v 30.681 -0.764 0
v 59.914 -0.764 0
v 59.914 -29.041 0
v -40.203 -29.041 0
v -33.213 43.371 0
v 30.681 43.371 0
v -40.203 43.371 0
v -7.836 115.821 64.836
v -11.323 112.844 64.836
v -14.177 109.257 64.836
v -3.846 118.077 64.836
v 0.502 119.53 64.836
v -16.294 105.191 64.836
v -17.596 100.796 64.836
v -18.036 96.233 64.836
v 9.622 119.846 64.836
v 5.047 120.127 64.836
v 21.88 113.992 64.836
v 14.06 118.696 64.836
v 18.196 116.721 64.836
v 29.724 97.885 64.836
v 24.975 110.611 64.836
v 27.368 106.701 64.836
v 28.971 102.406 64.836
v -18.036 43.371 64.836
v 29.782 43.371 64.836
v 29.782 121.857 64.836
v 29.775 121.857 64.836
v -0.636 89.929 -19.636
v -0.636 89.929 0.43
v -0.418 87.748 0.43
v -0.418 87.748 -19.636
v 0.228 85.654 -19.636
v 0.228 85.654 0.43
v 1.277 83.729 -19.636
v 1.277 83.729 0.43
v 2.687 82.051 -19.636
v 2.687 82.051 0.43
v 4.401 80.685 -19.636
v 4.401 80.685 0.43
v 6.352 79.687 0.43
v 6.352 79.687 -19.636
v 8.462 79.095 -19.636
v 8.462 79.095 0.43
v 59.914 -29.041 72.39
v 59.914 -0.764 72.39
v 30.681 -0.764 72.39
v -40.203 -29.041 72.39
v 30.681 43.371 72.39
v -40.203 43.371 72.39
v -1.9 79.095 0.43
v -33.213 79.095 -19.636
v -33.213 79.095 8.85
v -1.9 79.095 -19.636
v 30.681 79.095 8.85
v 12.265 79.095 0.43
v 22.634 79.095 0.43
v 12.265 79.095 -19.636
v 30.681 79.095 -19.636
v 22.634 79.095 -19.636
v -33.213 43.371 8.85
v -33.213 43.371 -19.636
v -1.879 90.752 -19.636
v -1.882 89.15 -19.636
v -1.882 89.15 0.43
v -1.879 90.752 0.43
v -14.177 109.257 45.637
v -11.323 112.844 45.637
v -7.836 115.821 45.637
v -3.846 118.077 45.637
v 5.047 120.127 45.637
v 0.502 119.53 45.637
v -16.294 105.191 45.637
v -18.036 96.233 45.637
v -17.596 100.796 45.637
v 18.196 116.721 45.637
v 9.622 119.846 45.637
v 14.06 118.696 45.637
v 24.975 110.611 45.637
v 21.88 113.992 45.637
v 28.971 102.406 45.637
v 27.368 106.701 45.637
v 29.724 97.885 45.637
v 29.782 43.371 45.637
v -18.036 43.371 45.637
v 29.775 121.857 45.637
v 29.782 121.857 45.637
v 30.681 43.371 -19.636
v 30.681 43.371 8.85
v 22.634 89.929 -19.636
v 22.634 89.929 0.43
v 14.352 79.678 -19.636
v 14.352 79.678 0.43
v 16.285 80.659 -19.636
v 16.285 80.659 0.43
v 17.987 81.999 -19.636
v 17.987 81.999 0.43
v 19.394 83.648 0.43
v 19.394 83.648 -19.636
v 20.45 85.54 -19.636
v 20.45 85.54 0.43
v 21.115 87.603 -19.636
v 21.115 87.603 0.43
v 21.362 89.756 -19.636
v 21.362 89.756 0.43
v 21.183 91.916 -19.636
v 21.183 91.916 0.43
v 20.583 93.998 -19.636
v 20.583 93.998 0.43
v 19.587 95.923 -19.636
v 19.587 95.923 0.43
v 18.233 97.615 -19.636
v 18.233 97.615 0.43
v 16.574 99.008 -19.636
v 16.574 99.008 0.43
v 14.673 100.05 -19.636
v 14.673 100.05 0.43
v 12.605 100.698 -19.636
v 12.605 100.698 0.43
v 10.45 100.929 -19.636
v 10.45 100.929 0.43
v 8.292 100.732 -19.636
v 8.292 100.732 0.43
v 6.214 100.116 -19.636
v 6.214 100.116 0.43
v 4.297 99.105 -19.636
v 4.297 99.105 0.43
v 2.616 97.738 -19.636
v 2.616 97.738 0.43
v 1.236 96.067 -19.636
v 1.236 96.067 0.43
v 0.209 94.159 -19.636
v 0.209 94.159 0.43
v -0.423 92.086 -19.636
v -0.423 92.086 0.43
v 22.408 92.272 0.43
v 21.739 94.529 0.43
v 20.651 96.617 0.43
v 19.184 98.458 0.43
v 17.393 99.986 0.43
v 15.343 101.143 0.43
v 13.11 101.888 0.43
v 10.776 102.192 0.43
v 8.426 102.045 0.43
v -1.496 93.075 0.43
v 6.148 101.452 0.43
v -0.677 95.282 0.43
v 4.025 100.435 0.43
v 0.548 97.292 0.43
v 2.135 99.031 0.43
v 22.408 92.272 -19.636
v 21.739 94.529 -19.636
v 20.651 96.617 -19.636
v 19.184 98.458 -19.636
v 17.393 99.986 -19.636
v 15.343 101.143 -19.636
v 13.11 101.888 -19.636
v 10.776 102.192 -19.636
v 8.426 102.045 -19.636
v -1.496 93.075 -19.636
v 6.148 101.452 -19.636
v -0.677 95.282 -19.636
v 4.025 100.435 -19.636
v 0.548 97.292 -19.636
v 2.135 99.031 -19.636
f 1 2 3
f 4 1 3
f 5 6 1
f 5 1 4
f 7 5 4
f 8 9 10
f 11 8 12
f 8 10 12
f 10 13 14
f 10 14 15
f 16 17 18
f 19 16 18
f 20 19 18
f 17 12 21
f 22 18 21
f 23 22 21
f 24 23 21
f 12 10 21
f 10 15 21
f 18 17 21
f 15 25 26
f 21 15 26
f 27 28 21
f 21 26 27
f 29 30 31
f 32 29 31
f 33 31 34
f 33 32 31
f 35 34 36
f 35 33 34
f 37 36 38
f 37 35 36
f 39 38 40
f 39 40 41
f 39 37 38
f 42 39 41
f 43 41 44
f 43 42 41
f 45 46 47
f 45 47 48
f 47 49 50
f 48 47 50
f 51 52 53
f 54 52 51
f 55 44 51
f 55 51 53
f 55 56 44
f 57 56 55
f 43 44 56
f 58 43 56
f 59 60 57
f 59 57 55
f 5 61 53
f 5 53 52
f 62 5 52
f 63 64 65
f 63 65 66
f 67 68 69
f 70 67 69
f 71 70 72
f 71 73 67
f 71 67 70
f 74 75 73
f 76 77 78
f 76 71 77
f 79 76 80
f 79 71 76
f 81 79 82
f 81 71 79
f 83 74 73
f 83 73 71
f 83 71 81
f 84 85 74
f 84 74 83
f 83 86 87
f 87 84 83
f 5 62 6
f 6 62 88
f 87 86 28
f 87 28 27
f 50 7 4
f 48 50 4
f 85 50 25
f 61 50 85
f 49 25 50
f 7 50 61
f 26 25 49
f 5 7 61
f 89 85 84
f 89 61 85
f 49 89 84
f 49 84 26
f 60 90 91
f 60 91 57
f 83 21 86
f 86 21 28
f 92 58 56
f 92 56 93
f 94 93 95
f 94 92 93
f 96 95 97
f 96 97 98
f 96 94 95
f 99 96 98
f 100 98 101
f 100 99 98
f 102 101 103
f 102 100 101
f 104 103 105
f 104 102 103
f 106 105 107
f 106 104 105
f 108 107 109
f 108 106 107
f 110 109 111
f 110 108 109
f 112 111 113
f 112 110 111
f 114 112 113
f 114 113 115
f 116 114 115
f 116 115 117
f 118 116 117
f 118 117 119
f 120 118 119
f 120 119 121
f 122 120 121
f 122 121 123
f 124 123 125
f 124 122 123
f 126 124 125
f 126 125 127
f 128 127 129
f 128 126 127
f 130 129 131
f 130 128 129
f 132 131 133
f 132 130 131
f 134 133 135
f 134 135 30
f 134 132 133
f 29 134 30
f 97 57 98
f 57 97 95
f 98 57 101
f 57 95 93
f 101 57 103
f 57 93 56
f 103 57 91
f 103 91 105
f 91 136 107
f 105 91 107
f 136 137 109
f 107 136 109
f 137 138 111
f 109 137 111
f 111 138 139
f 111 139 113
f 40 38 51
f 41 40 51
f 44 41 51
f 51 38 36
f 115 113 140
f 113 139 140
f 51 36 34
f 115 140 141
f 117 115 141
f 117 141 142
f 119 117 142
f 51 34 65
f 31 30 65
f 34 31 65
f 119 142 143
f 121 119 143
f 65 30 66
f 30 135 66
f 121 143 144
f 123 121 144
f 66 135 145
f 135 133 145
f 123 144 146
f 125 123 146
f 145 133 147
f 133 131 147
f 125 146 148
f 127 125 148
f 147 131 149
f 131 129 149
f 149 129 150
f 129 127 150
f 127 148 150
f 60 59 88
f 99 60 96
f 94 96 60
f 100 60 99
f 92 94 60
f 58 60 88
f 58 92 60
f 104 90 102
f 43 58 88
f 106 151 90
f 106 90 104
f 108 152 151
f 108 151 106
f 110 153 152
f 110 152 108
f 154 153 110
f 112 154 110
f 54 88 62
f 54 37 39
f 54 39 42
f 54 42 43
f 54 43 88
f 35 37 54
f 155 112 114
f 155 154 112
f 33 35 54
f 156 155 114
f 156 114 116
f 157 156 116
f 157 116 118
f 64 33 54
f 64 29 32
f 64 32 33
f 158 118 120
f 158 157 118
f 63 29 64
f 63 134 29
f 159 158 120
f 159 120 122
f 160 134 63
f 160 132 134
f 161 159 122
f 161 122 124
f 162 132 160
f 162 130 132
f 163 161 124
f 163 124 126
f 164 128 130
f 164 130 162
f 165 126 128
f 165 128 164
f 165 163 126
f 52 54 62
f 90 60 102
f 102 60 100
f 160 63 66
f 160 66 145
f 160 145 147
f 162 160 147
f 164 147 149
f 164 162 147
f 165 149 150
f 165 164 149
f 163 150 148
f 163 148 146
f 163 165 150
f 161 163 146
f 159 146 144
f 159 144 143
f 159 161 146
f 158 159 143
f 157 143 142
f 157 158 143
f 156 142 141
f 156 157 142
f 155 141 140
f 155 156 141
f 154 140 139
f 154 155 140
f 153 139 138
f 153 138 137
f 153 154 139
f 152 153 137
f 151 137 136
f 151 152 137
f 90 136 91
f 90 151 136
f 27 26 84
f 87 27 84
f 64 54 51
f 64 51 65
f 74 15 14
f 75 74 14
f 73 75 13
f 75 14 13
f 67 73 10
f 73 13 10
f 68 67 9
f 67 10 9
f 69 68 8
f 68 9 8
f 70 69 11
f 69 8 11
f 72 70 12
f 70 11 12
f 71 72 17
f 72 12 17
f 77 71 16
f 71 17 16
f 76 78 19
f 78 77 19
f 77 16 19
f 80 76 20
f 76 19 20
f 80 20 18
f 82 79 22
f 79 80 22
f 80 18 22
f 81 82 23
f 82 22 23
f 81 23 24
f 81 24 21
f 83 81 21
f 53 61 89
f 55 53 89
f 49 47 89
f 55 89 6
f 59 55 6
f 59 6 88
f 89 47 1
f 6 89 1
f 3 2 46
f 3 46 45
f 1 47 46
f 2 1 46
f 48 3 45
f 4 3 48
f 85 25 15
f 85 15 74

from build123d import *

# Parameters (mm, degrees)
EXTRUDE_1_DEPTH     = 72.39
SKETCH_2_W          = 63.894569667
SKETCH_2_H          = 50.584743582
EXTRUDE_2_DEPTH     = 35.72348927
SKETCH_3_W          = 47.81706323
SKETCH_3_H          = 19.199275388
EXTRUDE_4_DEPTH     = 78.486
CUT_EXTRUDE_4_DEPTH = 22.098
SKETCH_7_W          = 85.131498904
SKETCH_7_H          = 43.590498022
CUT_EXTRUDE_5_DEPTH = 22.098
EXTRUDE_5_DEPTH     = 20.066


with BuildPart() as part:
    # 草图1 → 凸台-拉伸1 (new body)
    with BuildSketch(Plane.XY):
        Polygon((30.681441224, -0.764247788), (59.9139191, -0.764247788), (59.9139191, -29.041415929), (-40.202541077, -29.041415929), (-40.202541077, -0.764247788), (-40.202541077, 43.371061947), (30.681441224, 43.371061947), align=None)
    extrude(amount=EXTRUDE_1_DEPTH)

    # 草图2 → 凸台-拉伸2 (add)
    with BuildSketch(Plane(origin=(0, 43.371061947, 0), x_dir=(1, 0, 0), z_dir=(0, 1, 0))):
        with Locations((-1.26584361, 16.441925792)):
            Rectangle(SKETCH_2_W, SKETCH_2_H)
    extrude(amount=EXTRUDE_2_DEPTH)

    # 草图3 → 凸台-拉伸4 (add)
    with BuildSketch(Plane(origin=(0, 43.371061947, 0), x_dir=(1, 0, 0), z_dir=(0, 1, 0))):
        with Locations((5.873027985, -55.236552657)):
            Rectangle(SKETCH_3_W, SKETCH_3_H)
    extrude(amount=EXTRUDE_4_DEPTH)

    # 草图6 → 切除-拉伸4 (cut)
    with BuildSketch(Plane.XY.offset(64.836190351)):
        with BuildLine():
            Line((-18.03550363, 121.857061947), (-18.03550363, 96.233075723))
            ThreePointArc((-18.03550363, 96.233075723), (5.04667963, 120.12732257), (29.724437597, 97.884784986))
            Line((29.724437597, 97.884784986), (29.774943726, 121.857061947))
            Line((29.774943726, 121.857061947), (-18.03550363, 121.857061947))
        make_face()
    extrude(amount=-CUT_EXTRUDE_4_DEPTH, mode=Mode.SUBTRACT)

    # 草图7 → 切除-拉伸5 (cut)
    with BuildSketch(Plane(origin=(0, 0, -41.734297583), x_dir=(-1, 0, 0), z_dir=(0, 0, -1))):
        with Locations((8.884308228, 58.531001223)):
            Rectangle(SKETCH_7_W, SKETCH_7_H)
    extrude(amount=-CUT_EXTRUDE_5_DEPTH, mode=Mode.SUBTRACT)

    # 草图8 → 凸台-拉伸5 (add)
    with BuildSketch(Plane(origin=(0, 0, -19.636297583), x_dir=(-1, 0, 0), z_dir=(0, 0, -1))):
        with BuildLine():
            ThreePointArc((1.878708632, 90.752463726), (-10.775595888, 102.192073522), (-22.633627477, 89.928991445))
            Line((-22.633627477, 89.928991445), (-22.633627477, 79.094551217))
            Line((-22.633627477, 79.094551217), (-12.26491781, 79.094551217))
            ThreePointArc((-12.26491781, 79.094551217), (-17.43772835, 98.352594999), (0.636372523, 89.928991445))
            ThreePointArc((0.636372523, 89.928991445), (-1.940023923, 82.854890572), (-8.462337143, 79.094551217))
            Line((-8.462337143, 79.094551217), (1.899704254, 79.094551217))
            Line((1.899704254, 79.094551217), (1.881595314, 89.149620673))
            Line((1.881595314, 89.149620673), (1.878708632, 90.752463726))
        make_face()
        with BuildLine():
            Line((-12.26491781, 79.094551217), (-22.633627477, 79.094551217))
            Line((-22.633627477, 79.094551217), (-22.633627477, 75.391965029))
            Line((-22.633627477, 75.391965029), (1.906372523, 75.391965029))
            Line((1.906372523, 75.391965029), (1.899704254, 79.094551217))
            Line((1.899704254, 79.094551217), (-8.462337143, 79.094551217))
            ThreePointArc((-8.462337143, 79.094551217), (-10.363627477, 78.928991445), (-12.26491781, 79.094551217))
        make_face()
    extrude(amount=-EXTRUDE_5_DEPTH)


solid = part.part
